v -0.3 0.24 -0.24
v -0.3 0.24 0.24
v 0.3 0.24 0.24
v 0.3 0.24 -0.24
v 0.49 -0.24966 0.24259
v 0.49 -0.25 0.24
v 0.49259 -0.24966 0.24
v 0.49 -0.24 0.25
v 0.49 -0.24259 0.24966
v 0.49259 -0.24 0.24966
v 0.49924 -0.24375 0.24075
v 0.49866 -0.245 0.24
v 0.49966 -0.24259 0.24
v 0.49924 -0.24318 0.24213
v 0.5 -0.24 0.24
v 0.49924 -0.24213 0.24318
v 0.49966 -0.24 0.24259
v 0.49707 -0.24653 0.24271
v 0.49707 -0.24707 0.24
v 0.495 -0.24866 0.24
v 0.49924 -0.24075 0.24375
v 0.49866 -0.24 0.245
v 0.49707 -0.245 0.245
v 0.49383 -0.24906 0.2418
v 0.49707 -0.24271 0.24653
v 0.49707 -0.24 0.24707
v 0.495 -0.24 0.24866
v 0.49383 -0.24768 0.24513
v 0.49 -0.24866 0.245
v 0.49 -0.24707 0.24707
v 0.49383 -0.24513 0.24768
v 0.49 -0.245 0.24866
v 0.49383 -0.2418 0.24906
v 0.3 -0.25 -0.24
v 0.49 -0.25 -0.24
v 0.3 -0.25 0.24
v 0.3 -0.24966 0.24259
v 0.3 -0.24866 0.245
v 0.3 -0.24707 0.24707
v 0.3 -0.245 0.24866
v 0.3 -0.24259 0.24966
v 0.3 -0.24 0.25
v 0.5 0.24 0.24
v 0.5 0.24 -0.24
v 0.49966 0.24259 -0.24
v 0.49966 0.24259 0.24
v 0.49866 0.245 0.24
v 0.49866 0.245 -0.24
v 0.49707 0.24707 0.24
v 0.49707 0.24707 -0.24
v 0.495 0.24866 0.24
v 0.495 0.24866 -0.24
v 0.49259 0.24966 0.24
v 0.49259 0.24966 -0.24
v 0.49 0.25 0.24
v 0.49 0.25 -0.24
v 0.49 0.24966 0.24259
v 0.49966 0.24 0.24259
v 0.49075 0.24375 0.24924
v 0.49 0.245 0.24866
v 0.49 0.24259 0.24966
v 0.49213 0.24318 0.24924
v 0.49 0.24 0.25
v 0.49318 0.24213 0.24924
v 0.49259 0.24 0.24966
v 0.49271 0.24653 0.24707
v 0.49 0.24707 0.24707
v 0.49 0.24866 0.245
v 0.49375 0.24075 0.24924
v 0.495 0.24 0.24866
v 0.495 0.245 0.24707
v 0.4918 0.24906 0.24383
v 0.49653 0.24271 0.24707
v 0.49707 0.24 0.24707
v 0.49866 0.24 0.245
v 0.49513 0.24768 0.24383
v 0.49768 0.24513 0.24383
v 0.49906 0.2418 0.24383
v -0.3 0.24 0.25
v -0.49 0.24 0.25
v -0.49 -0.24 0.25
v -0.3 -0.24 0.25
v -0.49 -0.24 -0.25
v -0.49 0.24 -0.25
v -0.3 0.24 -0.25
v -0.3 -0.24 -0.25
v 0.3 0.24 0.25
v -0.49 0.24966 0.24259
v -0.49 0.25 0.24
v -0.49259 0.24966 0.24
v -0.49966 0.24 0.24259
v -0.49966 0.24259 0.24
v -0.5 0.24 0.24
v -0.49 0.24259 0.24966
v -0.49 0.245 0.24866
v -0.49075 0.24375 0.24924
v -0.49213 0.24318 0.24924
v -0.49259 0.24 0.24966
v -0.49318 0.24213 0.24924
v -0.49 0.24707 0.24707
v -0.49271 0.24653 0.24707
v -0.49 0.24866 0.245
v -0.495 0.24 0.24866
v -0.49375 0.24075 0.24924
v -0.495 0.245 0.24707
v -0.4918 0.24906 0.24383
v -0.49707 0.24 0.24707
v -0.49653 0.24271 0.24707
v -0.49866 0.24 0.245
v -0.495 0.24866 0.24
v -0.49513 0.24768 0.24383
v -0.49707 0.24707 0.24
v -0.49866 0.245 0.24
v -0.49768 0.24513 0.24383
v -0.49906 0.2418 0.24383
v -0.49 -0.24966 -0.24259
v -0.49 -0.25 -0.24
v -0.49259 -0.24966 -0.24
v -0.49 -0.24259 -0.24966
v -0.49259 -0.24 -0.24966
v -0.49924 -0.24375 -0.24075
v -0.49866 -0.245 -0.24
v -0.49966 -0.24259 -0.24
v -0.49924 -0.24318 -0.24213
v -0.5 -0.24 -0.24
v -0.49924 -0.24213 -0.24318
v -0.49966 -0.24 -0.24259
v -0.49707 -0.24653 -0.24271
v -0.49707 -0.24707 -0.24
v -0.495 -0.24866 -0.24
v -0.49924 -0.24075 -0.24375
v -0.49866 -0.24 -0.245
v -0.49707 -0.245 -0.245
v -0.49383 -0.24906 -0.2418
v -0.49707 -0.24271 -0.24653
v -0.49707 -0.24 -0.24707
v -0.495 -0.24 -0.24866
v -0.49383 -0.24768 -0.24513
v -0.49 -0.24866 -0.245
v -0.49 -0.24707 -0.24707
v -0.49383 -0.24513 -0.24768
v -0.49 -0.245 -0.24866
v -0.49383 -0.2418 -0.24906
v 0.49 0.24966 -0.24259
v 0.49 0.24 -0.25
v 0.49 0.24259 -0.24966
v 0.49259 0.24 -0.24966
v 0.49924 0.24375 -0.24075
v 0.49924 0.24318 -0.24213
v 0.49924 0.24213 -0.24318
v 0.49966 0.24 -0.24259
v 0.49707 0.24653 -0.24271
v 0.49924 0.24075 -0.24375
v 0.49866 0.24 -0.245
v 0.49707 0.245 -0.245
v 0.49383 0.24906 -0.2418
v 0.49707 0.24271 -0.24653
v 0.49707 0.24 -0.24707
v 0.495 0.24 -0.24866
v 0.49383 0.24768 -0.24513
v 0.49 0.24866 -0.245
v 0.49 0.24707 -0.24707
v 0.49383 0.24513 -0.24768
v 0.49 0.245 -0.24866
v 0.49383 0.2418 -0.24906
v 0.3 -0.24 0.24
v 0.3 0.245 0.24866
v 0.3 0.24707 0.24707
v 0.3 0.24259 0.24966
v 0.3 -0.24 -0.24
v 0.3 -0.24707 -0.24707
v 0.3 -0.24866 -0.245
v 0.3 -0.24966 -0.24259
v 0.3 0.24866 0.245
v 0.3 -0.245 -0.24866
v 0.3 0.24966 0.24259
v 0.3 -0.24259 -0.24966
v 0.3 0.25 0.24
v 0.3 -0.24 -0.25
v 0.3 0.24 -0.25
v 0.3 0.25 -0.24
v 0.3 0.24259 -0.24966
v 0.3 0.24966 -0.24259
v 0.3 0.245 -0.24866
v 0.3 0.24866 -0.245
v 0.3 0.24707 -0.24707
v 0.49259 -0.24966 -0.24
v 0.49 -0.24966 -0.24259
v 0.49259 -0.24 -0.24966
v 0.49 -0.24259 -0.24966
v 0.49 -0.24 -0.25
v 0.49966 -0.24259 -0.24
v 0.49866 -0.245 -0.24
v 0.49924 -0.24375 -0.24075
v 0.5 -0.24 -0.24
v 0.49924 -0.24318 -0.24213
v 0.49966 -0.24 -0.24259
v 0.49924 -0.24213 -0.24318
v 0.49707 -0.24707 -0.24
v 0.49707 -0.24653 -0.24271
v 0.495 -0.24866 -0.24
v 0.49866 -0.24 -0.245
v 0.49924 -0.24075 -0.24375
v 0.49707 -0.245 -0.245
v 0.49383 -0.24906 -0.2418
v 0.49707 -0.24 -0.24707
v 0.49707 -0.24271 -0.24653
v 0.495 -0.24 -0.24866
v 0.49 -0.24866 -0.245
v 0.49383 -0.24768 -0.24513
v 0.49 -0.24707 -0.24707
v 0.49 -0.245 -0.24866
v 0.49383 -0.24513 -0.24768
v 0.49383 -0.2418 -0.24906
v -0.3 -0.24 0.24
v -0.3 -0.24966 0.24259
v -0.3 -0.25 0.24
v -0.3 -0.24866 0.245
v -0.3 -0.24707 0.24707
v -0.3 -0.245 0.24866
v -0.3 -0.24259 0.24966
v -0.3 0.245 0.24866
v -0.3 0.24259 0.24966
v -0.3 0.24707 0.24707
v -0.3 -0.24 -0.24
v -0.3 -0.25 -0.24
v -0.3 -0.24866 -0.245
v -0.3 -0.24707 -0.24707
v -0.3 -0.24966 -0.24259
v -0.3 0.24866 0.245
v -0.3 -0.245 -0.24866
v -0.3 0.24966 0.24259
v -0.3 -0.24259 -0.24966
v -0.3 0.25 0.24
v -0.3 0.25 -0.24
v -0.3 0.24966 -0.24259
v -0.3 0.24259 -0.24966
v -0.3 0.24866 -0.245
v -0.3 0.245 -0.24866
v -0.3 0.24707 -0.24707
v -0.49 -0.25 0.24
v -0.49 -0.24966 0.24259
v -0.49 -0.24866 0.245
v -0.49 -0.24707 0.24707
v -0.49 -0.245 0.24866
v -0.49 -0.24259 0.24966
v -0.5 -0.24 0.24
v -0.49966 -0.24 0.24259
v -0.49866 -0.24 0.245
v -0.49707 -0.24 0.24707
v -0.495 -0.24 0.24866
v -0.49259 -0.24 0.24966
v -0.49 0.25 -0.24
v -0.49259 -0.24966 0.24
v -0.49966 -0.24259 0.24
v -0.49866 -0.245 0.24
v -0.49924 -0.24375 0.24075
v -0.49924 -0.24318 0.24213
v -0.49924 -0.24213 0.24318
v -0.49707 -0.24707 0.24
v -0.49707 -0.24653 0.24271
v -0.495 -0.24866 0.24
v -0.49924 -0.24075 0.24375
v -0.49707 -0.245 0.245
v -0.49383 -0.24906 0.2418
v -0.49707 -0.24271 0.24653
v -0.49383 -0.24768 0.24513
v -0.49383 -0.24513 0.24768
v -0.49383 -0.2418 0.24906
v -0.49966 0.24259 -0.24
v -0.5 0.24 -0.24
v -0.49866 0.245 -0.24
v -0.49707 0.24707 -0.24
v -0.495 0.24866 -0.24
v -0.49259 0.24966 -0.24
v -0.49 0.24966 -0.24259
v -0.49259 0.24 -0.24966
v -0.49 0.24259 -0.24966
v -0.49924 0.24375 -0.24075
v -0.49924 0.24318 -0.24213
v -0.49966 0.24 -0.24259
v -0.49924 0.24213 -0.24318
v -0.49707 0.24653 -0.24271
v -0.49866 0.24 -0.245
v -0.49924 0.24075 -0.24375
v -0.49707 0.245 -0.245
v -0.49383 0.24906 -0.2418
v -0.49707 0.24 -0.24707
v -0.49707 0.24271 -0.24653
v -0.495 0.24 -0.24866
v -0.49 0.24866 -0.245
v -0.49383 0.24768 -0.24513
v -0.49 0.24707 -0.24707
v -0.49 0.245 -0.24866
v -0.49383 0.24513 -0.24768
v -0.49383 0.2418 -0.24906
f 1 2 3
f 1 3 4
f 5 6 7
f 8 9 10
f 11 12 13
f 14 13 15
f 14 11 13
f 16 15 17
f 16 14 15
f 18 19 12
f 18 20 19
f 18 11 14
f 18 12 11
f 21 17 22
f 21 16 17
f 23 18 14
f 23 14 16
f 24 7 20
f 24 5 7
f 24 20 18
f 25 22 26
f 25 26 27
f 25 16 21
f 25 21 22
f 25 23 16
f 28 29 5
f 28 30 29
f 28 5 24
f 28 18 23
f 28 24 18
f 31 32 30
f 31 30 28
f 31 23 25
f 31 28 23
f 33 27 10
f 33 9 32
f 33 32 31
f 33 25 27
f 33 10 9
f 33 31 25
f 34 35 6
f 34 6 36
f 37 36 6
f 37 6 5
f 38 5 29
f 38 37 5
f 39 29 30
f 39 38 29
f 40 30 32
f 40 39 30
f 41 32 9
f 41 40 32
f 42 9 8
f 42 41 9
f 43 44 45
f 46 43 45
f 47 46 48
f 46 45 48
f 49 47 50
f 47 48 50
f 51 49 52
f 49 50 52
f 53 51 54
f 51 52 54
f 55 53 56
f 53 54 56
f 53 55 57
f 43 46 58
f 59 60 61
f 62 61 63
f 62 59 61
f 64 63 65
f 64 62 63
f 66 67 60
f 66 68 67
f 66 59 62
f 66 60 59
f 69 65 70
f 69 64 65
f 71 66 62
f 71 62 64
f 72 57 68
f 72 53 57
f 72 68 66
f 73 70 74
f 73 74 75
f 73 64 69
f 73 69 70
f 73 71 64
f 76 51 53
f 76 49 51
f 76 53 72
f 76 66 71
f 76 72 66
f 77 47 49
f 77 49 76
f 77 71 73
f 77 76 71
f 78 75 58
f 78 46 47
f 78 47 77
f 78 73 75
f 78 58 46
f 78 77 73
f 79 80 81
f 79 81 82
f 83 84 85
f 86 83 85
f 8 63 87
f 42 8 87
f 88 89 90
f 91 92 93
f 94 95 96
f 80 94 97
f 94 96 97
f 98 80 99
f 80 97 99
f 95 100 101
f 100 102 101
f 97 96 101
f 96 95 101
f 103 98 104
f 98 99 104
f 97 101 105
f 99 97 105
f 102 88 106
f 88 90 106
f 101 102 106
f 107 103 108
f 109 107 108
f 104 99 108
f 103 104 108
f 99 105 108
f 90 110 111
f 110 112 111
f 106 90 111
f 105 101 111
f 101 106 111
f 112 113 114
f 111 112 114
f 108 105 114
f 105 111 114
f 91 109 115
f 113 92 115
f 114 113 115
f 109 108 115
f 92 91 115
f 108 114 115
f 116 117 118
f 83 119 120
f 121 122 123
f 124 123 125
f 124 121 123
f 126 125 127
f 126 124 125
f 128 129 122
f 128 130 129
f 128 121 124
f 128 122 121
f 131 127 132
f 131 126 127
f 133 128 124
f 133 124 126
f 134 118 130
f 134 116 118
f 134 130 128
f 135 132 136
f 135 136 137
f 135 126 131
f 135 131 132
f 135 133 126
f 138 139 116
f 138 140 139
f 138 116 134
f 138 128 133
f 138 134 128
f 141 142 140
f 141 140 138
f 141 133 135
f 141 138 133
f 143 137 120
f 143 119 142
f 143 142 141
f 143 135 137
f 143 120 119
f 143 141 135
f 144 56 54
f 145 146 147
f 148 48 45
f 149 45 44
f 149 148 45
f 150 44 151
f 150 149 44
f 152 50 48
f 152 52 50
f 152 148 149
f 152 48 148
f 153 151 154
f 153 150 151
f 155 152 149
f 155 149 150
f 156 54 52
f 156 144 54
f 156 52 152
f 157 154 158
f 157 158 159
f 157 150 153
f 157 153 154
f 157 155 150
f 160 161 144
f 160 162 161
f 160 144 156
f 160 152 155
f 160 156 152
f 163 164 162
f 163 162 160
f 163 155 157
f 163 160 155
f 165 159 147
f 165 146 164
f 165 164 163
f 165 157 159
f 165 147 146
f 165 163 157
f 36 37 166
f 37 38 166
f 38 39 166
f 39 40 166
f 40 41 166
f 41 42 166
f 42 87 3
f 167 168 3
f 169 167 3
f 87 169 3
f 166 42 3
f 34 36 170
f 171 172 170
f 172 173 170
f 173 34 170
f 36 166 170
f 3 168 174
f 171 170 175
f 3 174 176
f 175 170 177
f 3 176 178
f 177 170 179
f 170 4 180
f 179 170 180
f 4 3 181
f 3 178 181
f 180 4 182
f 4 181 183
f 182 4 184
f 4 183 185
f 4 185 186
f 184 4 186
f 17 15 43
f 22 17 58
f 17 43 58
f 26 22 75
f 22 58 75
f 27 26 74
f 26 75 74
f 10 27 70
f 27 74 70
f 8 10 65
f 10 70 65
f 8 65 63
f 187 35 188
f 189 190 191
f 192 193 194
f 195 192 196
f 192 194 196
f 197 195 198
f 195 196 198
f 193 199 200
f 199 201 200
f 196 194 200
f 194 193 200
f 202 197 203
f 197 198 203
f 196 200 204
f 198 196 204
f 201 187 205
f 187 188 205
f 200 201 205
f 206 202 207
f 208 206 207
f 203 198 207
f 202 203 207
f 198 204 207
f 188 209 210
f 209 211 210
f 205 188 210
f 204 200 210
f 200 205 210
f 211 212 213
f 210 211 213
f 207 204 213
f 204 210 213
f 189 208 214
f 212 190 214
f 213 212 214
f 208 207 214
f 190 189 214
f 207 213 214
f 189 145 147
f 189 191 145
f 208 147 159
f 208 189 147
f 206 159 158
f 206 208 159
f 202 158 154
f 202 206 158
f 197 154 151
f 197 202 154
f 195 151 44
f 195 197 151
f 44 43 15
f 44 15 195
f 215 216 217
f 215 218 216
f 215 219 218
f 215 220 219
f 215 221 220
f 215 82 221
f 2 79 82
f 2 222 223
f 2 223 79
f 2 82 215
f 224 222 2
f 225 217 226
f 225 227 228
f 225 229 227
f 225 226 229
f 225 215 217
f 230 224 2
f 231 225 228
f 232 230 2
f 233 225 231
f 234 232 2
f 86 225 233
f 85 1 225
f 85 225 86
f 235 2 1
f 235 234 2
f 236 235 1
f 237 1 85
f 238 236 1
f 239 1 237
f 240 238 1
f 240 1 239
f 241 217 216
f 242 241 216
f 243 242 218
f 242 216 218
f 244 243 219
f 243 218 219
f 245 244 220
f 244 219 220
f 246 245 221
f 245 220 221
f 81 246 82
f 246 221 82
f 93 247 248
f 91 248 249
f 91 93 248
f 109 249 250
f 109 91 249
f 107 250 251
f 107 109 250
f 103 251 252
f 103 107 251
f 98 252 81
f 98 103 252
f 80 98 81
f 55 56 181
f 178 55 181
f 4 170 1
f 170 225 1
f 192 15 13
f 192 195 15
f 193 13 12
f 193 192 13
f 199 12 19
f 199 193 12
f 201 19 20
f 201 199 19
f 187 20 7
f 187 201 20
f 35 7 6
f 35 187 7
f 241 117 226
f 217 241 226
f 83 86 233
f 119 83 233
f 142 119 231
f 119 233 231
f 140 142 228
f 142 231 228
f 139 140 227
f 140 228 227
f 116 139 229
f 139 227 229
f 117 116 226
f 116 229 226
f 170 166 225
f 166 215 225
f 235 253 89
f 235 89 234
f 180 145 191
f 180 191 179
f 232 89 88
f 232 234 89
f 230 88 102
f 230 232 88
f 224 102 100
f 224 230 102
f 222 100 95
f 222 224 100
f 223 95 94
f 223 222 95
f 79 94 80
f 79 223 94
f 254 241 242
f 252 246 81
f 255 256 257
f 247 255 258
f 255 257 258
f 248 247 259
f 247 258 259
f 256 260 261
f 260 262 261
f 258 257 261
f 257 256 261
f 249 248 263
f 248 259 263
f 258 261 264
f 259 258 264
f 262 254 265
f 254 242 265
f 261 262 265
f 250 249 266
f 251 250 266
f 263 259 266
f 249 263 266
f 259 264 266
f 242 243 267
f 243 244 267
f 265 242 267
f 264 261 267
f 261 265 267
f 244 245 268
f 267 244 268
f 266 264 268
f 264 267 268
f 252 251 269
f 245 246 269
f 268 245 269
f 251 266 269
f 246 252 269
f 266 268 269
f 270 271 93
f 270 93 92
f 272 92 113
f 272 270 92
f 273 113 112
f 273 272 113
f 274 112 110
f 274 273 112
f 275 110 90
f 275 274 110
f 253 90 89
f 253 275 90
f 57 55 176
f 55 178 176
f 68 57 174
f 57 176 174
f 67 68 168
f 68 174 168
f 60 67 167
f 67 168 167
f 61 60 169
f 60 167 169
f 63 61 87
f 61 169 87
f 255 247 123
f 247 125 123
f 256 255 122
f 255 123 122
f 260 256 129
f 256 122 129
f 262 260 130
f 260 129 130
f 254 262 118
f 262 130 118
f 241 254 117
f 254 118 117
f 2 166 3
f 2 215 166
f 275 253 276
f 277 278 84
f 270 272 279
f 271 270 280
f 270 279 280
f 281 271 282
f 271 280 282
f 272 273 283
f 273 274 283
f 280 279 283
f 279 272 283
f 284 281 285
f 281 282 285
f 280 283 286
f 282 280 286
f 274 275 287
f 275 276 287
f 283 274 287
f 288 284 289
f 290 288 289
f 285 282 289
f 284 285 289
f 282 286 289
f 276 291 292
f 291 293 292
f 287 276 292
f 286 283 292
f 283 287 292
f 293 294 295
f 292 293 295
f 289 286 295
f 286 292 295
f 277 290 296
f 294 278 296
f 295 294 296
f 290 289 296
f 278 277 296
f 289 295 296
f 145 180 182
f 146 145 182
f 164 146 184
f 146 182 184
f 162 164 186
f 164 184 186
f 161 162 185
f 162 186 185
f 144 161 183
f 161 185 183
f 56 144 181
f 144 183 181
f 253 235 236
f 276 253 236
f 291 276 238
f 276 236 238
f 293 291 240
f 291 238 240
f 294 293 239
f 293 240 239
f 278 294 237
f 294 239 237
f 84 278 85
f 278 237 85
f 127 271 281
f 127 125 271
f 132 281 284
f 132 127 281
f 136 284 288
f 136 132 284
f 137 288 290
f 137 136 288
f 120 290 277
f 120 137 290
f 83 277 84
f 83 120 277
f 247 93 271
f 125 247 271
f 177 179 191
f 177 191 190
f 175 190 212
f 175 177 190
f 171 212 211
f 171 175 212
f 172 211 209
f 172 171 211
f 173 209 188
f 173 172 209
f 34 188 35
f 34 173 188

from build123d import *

# Parameters (mm, degrees)
SKETCH1_W            = 0.2
SKETCH1_H            = 0.5
THICKNESS_DEPTH      = 0.25
FILLET1_R            = 0.01
SKETCH2_W            = 0.48
SKETCH2_H            = 0.48
BOSS_EXTRUDE2_DEPTH  = 0.3
FILLET1_OF_MIRROR3_R = 0.01


with BuildPart() as part:
    # Sketch1 → THICKNESS (new body, symmetric)
    with BuildSketch(Plane(origin=(0, 0, 0), x_dir=(1, 0, 0), z_dir=(0, 1, 0))):
        with Locations((-0.4, 0)):
            Rectangle(SKETCH1_W, SKETCH1_H)
    thickness = extrude(amount=THICKNESS_DEPTH, both=True)

    # Fillet1
    fillet1_edges = [part.edges().sort_by_distance(p)[0] for p in [
        (-0.4, 0.25, -0.25),
        (-0.5, 0.25, 0),
        (-0.4, -0.25, -0.25),
        (-0.4, -0.25, 0.25),
        (-0.5, -0.25, 0),
        (-0.4, 0.25, 0.25),
        (-0.5, 0, -0.25),
        (-0.5, 0, 0.25),
    ]]
    fillet(fillet1_edges, radius=FILLET1_R)

    # Sketch2 → Boss-Extrude2 (add)
    with BuildSketch(Plane(origin=(0, 0, 0), x_dir=(0, 0, -1), z_dir=(1, 0, 0))):
        Rectangle(SKETCH2_W, SKETCH2_H)
    boss_extrude2 = extrude(amount=-BOSS_EXTRUDE2_DEPTH)

    # Mirror3: THICKNESS, Boss-Extrude2 across plane
    add(thickness.mirror(Plane(origin=(0, 0, 0), x_dir=(0, 0, 1), z_dir=(1, 0, 0))))
    add(boss_extrude2.mirror(Plane(origin=(0, 0, 0), x_dir=(0, 0, 1), z_dir=(1, 0, 0))))

    # Fillet1 of Mirror3
    fillet1_of_mirror3_edges = [part.edges().sort_by_distance(p)[0] for p in [
        (0.4, 0.25, -0.25),
        (0.5, 0.25, 0),
        (0.4, -0.25, -0.25),
        (0.4, -0.25, 0.25),
        (0.5, -0.25, 0),
        (0.4, 0.25, 0.25),
        (0.5, 0, -0.25),
        (0.5, 0, 0.25),
    ]]
    fillet(fillet1_of_mirror3_edges, radius=FILLET1_OF_MIRROR3_R)


solid = part.part
